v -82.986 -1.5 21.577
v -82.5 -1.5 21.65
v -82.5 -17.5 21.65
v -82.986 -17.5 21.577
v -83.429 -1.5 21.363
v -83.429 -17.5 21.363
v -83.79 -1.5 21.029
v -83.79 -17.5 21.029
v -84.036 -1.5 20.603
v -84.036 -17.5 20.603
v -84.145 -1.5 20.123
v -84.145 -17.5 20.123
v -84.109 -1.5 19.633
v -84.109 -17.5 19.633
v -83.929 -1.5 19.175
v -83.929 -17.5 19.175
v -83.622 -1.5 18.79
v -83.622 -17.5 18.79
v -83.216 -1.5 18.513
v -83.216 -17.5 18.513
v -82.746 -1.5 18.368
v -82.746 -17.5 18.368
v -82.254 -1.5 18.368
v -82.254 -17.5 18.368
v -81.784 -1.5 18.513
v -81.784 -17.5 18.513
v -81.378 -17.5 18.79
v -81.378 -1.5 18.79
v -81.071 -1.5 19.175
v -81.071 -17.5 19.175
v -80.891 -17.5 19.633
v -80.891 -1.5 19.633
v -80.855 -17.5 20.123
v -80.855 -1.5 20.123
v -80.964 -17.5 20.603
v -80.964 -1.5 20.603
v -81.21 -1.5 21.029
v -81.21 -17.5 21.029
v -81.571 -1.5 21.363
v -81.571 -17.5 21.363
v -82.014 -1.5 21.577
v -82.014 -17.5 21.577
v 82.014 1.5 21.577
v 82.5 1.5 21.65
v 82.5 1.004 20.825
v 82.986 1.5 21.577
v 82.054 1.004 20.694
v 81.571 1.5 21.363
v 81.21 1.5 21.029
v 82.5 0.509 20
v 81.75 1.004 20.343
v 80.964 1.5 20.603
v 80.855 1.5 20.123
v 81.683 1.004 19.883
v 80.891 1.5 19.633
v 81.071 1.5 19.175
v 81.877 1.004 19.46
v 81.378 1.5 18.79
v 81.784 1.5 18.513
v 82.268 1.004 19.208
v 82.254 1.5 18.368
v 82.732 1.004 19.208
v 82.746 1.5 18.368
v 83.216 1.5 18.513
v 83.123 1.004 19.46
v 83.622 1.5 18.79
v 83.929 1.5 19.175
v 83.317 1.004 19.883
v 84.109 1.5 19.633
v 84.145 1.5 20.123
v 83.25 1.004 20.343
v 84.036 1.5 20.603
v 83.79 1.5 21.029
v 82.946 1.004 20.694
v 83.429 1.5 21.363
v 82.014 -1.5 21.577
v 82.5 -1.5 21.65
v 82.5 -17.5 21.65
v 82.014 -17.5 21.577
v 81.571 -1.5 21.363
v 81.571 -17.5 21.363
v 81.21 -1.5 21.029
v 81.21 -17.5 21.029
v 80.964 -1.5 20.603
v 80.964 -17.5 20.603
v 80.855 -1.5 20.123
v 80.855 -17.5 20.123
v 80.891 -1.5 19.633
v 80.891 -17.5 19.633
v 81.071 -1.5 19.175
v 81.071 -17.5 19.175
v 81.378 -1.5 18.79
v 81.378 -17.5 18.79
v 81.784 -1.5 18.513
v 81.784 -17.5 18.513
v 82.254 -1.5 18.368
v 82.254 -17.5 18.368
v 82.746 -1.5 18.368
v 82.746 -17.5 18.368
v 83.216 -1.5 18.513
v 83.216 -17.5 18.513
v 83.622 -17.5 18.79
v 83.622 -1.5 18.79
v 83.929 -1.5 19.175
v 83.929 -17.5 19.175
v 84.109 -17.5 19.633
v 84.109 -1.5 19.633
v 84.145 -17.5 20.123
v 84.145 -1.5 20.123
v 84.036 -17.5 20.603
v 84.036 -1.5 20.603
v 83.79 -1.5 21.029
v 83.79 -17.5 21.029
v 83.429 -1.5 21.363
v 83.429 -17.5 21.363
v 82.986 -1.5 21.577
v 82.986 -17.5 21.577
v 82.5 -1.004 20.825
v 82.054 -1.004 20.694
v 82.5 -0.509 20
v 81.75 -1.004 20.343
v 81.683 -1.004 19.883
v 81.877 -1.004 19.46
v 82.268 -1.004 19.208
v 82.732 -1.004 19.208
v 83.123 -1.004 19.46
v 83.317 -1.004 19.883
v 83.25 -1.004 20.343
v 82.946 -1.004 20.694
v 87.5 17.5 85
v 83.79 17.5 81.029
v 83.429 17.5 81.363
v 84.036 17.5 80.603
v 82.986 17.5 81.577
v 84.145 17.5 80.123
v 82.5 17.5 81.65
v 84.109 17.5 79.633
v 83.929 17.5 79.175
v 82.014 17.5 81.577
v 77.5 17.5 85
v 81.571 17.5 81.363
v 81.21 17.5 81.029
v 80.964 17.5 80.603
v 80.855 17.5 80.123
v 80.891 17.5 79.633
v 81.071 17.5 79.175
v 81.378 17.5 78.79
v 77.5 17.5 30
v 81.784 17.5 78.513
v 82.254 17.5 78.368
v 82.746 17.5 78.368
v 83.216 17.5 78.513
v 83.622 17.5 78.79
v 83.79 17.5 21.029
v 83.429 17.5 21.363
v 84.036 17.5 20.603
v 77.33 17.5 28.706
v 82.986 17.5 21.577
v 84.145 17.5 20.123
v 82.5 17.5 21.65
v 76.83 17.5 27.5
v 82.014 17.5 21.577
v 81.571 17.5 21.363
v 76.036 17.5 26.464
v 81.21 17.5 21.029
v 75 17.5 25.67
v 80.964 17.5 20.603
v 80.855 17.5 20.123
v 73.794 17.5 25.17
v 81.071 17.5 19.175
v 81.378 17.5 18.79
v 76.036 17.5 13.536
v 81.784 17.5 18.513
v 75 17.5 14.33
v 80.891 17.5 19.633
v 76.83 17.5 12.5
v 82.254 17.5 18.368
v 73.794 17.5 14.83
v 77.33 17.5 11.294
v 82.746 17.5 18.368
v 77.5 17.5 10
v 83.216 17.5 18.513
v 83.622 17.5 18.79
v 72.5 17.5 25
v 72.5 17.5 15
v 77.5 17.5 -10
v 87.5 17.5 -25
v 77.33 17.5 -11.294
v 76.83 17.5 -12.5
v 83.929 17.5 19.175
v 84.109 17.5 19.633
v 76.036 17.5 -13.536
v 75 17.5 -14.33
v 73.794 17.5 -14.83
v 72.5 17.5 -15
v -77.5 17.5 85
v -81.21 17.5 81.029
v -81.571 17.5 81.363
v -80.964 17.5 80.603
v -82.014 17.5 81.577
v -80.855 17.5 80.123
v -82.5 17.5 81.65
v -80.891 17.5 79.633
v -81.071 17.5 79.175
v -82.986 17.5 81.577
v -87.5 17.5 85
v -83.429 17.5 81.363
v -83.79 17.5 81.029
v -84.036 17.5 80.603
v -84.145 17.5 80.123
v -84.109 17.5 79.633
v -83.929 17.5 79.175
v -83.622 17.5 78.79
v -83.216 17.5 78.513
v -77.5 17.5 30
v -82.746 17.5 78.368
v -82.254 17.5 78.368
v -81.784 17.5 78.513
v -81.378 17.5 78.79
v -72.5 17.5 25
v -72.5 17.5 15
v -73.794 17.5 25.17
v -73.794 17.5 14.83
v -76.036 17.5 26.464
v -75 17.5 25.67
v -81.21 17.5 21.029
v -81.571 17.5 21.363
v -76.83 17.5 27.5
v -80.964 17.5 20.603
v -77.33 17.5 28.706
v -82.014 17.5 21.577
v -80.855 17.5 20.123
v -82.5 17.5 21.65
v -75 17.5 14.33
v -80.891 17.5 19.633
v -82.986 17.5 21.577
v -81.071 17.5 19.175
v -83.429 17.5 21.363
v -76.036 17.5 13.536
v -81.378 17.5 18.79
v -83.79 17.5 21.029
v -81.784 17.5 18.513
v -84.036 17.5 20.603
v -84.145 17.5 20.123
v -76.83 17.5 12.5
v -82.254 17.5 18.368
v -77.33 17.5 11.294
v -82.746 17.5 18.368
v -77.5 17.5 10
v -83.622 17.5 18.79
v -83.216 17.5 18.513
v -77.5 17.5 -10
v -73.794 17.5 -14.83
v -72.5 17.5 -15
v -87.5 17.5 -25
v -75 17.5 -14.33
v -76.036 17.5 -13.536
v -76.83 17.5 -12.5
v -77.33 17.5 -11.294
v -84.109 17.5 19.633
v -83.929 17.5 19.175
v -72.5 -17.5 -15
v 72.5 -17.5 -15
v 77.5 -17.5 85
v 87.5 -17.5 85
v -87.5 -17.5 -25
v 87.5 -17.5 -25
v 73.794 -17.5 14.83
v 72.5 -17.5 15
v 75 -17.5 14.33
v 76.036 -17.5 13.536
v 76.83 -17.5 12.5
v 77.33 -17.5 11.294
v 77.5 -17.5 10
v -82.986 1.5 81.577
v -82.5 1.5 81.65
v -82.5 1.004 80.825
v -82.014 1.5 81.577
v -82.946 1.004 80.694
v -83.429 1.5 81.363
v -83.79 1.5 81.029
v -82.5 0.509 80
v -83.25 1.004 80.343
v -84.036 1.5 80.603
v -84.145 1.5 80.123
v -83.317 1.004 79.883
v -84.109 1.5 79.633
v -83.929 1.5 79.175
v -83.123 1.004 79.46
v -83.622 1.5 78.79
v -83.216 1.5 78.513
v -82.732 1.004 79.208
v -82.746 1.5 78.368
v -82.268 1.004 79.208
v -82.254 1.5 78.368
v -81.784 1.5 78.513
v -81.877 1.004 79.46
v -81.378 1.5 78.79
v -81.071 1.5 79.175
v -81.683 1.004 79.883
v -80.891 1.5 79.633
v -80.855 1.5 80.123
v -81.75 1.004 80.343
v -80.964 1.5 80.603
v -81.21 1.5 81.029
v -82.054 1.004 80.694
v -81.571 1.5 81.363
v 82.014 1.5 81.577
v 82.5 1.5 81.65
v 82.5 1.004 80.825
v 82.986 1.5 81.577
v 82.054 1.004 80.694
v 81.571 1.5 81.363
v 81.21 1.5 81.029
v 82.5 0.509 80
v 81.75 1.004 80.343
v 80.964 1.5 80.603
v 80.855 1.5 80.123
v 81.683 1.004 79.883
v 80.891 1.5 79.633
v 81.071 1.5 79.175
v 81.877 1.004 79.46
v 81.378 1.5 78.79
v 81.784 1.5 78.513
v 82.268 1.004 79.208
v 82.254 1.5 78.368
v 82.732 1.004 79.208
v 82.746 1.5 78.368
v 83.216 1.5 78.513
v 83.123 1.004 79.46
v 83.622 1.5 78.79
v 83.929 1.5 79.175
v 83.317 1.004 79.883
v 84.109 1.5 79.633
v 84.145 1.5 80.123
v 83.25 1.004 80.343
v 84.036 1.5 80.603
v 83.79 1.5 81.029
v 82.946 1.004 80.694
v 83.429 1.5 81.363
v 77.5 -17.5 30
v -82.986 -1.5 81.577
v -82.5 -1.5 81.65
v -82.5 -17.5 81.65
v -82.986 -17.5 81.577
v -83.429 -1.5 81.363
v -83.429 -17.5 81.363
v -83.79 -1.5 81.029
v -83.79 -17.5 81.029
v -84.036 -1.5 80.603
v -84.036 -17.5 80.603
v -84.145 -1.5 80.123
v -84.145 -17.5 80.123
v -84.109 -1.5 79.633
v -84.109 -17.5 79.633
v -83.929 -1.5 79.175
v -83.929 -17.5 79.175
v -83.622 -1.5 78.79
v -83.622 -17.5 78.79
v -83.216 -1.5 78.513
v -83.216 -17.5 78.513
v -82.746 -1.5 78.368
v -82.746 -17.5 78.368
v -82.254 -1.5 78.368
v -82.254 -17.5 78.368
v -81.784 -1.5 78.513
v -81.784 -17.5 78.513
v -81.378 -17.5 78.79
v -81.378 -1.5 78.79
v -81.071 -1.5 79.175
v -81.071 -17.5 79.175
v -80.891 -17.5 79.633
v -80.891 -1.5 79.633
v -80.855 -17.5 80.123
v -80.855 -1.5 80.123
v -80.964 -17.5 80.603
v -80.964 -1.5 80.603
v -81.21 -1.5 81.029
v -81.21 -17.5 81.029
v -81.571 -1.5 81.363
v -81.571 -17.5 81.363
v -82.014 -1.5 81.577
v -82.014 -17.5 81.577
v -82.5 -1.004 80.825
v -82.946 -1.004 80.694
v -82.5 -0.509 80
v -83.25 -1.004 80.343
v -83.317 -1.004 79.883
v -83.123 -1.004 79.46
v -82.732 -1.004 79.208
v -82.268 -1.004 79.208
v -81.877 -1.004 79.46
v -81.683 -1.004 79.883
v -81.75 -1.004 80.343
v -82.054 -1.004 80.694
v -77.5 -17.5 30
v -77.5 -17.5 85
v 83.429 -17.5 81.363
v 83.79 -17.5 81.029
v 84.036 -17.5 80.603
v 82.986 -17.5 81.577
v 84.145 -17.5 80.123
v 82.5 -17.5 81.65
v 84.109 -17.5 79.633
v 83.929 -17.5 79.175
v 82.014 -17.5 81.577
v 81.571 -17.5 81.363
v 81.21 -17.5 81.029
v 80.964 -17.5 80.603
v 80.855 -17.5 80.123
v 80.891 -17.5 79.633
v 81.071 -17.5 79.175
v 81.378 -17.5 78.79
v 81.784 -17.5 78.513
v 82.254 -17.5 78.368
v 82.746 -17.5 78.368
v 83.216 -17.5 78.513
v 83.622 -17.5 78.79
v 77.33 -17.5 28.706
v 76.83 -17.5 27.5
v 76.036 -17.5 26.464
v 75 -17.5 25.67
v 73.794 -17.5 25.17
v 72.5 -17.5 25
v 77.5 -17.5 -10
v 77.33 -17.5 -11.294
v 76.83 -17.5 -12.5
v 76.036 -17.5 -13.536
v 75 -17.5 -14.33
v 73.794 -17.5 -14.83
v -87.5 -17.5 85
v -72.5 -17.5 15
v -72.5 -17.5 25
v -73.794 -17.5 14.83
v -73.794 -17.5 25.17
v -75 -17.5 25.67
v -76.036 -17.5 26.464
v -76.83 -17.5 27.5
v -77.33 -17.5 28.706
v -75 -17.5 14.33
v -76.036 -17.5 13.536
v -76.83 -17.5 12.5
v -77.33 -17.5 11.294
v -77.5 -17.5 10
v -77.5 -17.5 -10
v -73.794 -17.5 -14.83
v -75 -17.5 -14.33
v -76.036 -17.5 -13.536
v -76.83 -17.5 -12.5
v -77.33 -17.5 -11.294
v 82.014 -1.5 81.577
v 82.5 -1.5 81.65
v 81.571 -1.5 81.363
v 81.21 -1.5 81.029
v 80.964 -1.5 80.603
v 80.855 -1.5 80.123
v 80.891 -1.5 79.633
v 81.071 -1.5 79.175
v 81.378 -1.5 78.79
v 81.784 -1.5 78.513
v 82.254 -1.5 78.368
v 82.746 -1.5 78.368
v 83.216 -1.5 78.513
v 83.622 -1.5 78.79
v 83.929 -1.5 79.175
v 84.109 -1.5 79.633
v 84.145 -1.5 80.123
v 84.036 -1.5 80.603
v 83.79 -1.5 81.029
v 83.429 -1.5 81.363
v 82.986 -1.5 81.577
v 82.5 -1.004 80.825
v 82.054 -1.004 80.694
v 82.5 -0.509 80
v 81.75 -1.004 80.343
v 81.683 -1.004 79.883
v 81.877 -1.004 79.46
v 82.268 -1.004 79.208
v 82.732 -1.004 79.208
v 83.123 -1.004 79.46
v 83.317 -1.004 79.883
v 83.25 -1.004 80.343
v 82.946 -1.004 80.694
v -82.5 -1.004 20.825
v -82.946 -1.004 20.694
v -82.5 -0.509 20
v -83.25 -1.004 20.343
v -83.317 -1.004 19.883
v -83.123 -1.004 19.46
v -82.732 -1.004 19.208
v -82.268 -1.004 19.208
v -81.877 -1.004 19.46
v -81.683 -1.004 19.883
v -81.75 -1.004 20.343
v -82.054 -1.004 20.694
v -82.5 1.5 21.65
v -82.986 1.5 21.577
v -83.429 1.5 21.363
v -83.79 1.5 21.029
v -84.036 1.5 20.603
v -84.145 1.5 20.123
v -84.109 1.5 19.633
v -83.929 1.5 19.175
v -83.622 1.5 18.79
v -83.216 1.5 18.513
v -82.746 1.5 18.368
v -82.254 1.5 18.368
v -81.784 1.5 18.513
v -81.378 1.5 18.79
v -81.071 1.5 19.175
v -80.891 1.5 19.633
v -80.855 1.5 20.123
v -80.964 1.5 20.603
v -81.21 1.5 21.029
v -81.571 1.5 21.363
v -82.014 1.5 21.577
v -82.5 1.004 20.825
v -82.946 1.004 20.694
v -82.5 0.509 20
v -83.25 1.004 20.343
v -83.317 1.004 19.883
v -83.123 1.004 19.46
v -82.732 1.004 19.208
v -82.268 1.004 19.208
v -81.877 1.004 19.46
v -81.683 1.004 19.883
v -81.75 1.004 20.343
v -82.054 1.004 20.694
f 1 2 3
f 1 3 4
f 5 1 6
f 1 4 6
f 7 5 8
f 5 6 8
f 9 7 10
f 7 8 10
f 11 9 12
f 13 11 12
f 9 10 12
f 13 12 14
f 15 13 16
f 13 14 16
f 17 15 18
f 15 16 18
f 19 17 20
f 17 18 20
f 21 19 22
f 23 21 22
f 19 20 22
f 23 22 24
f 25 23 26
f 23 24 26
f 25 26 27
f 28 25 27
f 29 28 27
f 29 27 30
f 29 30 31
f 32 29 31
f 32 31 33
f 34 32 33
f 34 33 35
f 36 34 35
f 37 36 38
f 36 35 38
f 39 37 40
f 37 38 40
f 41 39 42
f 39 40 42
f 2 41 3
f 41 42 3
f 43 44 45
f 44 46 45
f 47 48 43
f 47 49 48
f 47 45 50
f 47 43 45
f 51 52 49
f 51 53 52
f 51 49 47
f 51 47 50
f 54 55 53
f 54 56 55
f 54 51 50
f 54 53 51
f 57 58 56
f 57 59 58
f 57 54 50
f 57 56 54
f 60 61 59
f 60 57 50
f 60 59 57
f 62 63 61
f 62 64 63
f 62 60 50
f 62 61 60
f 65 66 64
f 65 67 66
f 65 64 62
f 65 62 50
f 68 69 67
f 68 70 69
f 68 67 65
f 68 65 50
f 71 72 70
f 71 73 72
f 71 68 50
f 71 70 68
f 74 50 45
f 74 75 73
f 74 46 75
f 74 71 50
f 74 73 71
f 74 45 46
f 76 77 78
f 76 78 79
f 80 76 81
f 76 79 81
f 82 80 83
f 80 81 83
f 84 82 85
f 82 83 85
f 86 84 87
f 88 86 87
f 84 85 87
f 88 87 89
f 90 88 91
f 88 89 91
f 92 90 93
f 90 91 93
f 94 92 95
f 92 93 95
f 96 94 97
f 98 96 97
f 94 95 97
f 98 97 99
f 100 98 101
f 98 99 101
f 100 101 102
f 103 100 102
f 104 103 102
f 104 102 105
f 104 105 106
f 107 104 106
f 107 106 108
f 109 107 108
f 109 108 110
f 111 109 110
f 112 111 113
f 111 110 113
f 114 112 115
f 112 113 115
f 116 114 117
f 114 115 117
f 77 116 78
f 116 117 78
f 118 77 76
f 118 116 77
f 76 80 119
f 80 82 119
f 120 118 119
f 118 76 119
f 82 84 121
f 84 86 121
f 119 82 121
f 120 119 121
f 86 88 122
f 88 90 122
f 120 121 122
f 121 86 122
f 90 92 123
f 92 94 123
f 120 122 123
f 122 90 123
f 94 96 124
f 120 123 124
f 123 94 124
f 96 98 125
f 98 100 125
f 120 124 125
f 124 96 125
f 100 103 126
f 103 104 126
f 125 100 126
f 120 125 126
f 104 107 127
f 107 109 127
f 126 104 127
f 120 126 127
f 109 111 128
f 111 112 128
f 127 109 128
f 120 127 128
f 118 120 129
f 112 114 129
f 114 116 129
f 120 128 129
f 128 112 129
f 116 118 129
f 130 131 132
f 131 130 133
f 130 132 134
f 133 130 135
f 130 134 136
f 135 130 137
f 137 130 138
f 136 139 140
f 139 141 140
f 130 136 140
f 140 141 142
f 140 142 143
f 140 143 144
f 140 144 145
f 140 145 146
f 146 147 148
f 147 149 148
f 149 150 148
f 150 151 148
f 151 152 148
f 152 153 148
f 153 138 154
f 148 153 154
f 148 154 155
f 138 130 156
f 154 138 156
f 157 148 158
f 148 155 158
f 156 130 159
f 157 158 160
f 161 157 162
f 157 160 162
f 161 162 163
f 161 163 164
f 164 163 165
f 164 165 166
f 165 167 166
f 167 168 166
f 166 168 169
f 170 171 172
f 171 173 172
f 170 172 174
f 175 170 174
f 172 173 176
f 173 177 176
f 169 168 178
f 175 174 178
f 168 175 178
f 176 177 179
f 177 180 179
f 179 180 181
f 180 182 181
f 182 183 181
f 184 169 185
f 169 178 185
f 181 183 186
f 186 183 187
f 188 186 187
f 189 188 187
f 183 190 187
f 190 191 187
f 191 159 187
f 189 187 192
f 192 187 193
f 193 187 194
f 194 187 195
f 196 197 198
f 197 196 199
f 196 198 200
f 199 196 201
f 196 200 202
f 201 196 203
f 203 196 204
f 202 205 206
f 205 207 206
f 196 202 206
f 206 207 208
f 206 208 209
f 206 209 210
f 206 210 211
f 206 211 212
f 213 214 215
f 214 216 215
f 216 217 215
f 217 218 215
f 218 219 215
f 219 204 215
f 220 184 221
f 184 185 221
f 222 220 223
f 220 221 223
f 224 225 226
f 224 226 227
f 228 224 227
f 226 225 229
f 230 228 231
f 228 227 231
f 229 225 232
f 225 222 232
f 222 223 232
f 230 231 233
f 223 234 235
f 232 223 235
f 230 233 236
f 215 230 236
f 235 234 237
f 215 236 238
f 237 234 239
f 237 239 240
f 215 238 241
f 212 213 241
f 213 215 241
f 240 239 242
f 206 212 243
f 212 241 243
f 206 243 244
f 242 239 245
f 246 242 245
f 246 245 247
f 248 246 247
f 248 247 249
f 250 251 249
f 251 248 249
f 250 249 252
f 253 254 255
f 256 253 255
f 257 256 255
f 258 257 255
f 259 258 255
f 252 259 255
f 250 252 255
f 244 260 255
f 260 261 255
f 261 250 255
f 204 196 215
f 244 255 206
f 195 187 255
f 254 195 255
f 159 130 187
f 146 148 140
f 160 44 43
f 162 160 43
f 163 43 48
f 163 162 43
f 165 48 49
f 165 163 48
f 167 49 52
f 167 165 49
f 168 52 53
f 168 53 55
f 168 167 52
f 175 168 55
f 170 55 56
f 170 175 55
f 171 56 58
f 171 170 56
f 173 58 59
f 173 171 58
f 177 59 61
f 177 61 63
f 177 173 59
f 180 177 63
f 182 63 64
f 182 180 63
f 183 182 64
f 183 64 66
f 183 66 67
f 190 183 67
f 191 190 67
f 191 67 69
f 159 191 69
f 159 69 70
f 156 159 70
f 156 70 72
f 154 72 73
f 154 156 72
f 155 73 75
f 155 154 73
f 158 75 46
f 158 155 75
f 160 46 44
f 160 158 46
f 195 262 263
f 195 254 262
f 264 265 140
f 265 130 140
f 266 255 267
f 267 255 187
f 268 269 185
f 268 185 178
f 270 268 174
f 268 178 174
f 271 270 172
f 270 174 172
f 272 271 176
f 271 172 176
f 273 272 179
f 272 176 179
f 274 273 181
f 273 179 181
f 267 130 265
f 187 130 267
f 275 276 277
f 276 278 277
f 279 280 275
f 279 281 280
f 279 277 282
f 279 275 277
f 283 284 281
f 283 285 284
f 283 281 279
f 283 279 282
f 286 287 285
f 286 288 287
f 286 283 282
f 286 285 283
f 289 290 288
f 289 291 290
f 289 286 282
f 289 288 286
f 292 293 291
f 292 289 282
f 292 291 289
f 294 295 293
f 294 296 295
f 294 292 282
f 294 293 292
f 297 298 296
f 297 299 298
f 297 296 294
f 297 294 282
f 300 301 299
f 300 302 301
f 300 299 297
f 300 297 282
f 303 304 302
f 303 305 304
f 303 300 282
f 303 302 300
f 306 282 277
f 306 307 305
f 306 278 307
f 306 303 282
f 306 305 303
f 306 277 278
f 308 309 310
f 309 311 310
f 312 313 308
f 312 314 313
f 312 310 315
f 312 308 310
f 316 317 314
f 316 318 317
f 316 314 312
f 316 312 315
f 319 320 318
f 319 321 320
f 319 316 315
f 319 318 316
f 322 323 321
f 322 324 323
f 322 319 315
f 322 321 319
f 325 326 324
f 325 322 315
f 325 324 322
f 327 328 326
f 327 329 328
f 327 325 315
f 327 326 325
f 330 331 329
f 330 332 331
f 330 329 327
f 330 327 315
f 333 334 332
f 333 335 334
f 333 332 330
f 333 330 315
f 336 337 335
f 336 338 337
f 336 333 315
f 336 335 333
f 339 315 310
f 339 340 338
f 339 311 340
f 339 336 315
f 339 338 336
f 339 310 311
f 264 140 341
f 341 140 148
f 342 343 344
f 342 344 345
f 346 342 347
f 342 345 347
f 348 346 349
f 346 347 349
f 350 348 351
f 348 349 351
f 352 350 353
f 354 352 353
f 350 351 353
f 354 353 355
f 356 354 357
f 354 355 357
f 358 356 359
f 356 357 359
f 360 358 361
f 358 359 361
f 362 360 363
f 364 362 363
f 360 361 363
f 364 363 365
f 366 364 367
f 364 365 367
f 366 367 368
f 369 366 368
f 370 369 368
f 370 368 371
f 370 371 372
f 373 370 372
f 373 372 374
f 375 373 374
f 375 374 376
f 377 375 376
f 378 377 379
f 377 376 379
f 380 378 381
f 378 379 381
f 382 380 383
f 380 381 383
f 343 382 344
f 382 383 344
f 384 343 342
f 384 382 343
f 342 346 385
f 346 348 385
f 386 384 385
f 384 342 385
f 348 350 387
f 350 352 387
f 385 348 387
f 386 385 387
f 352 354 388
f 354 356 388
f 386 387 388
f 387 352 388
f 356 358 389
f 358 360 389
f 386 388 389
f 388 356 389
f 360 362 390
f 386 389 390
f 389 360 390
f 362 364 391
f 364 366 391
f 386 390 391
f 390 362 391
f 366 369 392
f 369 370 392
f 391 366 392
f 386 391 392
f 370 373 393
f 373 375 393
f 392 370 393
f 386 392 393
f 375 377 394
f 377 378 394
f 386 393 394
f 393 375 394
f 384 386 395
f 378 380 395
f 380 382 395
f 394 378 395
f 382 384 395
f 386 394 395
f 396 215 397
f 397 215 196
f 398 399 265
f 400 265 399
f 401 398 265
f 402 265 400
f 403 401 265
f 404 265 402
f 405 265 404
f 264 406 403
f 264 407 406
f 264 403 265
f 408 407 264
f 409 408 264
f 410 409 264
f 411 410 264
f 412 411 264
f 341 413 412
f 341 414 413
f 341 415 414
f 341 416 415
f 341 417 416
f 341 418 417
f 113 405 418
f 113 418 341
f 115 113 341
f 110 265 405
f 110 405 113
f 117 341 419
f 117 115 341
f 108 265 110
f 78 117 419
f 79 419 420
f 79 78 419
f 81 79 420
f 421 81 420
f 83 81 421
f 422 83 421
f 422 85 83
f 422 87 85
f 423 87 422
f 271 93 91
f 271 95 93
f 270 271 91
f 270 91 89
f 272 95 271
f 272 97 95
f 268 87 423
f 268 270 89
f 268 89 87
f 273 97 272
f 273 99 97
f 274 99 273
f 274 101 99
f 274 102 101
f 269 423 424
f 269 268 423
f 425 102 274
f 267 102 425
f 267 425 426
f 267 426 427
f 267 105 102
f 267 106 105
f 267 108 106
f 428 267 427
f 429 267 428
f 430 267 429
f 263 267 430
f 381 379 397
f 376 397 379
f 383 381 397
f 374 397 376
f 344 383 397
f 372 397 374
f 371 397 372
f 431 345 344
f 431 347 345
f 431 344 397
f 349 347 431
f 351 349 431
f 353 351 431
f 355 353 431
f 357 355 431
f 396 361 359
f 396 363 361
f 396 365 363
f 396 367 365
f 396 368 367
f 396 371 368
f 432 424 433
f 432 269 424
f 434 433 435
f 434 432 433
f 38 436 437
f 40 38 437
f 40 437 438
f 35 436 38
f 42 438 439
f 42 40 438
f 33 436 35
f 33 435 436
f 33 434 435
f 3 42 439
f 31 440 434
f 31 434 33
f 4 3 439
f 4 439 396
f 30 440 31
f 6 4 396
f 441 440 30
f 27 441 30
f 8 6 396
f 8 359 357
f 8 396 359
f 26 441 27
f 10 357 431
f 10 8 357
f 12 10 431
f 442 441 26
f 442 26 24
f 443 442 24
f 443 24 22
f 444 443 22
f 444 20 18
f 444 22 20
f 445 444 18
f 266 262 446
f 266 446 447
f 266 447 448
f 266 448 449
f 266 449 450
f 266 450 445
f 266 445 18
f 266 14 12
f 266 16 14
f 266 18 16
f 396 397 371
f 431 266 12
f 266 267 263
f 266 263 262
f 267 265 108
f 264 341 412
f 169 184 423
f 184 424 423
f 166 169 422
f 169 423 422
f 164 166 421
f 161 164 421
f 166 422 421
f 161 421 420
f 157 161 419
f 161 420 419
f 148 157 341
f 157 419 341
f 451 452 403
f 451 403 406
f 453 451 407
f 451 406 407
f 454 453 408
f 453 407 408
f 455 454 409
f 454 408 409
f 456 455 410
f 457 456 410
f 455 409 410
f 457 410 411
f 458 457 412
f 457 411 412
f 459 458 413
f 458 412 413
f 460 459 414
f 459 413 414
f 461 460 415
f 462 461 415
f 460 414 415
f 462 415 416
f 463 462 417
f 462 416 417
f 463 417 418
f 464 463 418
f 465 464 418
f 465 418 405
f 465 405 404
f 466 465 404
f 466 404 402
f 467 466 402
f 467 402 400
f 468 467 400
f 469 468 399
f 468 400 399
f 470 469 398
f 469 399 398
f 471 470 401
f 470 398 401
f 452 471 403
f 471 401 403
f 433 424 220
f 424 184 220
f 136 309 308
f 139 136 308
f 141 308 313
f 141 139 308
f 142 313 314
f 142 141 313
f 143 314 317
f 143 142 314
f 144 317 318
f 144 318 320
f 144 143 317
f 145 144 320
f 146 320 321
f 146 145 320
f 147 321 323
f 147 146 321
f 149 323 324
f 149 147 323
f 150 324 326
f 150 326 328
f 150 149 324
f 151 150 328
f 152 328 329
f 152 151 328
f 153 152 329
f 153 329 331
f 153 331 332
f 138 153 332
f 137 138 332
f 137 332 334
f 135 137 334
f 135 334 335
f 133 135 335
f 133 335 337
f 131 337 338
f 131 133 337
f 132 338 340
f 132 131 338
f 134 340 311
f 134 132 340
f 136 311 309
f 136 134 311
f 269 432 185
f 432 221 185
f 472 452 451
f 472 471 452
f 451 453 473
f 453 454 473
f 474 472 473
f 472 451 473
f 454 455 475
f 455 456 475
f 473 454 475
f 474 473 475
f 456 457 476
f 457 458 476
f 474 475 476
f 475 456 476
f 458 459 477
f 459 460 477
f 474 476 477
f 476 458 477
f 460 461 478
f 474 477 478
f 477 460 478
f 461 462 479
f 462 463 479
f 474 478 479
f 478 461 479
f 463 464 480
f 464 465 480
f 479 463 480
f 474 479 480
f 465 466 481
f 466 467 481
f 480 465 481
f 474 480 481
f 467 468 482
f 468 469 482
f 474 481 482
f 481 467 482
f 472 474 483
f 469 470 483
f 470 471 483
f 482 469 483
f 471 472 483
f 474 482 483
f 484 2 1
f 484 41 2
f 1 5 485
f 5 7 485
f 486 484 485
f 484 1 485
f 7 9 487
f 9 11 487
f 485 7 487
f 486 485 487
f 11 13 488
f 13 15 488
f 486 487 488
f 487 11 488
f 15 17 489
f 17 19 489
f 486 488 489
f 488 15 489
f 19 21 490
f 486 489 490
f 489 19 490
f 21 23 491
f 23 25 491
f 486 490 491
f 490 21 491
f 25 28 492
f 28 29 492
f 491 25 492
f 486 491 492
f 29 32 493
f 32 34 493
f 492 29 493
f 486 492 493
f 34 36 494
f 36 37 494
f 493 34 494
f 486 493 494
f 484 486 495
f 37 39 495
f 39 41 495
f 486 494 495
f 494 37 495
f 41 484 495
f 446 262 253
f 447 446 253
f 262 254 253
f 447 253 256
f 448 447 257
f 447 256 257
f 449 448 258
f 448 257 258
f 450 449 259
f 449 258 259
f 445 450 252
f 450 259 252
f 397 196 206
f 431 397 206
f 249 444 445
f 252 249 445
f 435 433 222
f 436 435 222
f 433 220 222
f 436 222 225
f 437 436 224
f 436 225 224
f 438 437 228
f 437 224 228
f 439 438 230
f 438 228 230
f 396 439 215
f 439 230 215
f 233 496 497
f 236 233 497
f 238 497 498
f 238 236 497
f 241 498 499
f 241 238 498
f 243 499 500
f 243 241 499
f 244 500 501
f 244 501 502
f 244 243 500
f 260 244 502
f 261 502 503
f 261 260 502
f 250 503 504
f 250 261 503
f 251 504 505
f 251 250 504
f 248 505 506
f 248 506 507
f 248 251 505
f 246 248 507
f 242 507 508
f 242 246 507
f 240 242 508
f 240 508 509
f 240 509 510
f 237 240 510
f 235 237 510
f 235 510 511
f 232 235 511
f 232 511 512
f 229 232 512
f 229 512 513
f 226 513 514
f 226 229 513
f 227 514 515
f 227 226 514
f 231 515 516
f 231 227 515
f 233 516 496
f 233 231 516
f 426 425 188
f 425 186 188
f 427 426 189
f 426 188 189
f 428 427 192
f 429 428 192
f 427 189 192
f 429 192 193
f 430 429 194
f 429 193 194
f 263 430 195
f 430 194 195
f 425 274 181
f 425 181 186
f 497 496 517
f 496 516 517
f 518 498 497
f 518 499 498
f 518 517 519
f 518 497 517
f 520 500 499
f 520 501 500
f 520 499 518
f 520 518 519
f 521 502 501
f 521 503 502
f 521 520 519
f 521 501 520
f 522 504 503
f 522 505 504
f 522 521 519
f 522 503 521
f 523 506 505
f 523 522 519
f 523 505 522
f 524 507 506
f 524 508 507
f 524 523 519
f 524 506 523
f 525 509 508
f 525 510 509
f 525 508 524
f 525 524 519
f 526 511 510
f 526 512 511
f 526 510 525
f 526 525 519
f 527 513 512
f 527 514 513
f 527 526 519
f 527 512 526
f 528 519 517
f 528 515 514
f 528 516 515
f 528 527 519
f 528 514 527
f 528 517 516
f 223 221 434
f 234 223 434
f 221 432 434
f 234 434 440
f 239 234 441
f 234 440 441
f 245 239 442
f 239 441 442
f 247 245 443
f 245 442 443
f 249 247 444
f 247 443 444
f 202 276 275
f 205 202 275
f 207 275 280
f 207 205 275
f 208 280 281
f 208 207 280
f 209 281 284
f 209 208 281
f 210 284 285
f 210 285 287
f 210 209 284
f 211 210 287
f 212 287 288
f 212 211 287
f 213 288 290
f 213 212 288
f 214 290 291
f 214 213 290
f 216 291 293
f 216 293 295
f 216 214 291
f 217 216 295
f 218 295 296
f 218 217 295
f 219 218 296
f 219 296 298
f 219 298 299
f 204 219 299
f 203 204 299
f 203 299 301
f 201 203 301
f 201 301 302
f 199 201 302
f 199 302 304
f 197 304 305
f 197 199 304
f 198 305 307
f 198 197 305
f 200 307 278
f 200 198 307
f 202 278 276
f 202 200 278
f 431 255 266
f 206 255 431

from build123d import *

# Parameters (mm, degrees)
SKETCH1_W                  = 155
SKETCH1_H                  = 30
BOSS_EXTRUDE1_DEPTH        = 17.5
FILLET1_R                  = 5
M4_TAPPED_HOLE2_AT_2_COUNT = 2
M4_TAPPED_HOLE2_AT_2_PITCH = 60
M4_TAPPED_HOLE2_AT_3_COUNT = 2
M4_TAPPED_HOLE2_AT_3_PITCH = 175.570498661
M4_TAPPED_HOLE2_AT_4_COUNT = 2
M4_TAPPED_HOLE2_AT_4_PITCH = 165


with BuildPart() as part:
    # Sketch1 → Boss-Extrude1 (new, symmetric)
    with BuildSketch(Plane(origin=(0, 0, 0), x_dir=(1, 0, 0), z_dir=(0, 1, 0))):
        Polygon((-87.5, 25), (87.5, 25), (87.5, -25), (87.5, -85), (77.5, -85), (77.5, -25), (-77.5, -25), (-77.5, -85), (-87.5, -85), (-87.5, -25), align=None)
        Rectangle(SKETCH1_W, SKETCH1_H, mode=Mode.SUBTRACT)
    extrude(amount=BOSS_EXTRUDE1_DEPTH, both=True)

    # Fillet1
    fillet1_edges = [part.edges().sort_by_distance(p)[0] for p in [
        (77.5, 0, 25),
        (-77.5, 0, 25),
        (-77.5, 0, 15),
        (-77.5, 0, -15),
        (77.5, 0, -15),
        (77.5, 0, 15),
    ]]
    fillet(fillet1_edges, radius=FILLET1_R)

    # Sketch4 → M4 Tapped Hole2 (revolve, cut)
    with BuildSketch(Plane(origin=(-82.5, 17.5, 20), x_dir=(0, 0, 1), z_dir=(1, 0, 0))):
        Polygon((0, 0), (0, 16.991420021), (1.65, 16), (1.65, 0), align=None)
    m4_tapped_hole2 = revolve(axis=Axis((-82.5, 23.85, 20), (0, -1, 0)), mode=Mode.SUBTRACT)

    # M4 Tapped Hole2 at 2: M4 Tapped Hole2 ×2
    with Locations(*[(0, 0, i * M4_TAPPED_HOLE2_AT_2_PITCH) for i in range(1, M4_TAPPED_HOLE2_AT_2_COUNT)]):
        add(m4_tapped_hole2, mode=Mode.SUBTRACT)

    # M4 Tapped Hole2 at 3: M4 Tapped Hole2 ×2
    with Locations(*[Vector(0.9397934234884371, 0, 0.3417430630867045) * (i * M4_TAPPED_HOLE2_AT_3_PITCH) for i in range(1, M4_TAPPED_HOLE2_AT_3_COUNT)]):
        add(m4_tapped_hole2, mode=Mode.SUBTRACT)

    # M4 Tapped Hole2 at 4: M4 Tapped Hole2 ×2
    with Locations(*[(i * M4_TAPPED_HOLE2_AT_4_PITCH, 0, 0) for i in range(1, M4_TAPPED_HOLE2_AT_4_COUNT)]):
        add(m4_tapped_hole2, mode=Mode.SUBTRACT)

    # Mirror1: M4 Tapped Hole2 across plane
    add(m4_tapped_hole2.mirror(Plane.ZX), mode=Mode.SUBTRACT)

    # Mirror1 copy 1 sketch → Mirror1 copy 1 (revolve, cut)
    with BuildSketch(Plane(origin=(-82.5, -17.5, 80), x_dir=(0, 0, 1), z_dir=(1, 0, 0))):
        Polygon((0, 0), (0, -16.991420021), (1.65, -16), (1.65, 0), align=None)
    revolve(axis=Axis((-82.5, -23.85, 80), (0, -1, 0)), mode=Mode.SUBTRACT)

    # Mirror1 copy 2 sketch → Mirror1 copy 2 (revolve, cut)
    with BuildSketch(Plane(origin=(82.5, -17.5, 80), x_dir=(0, 0, 1), z_dir=(1, 0, 0))):
        Polygon((0, 0), (0, -16.991420021), (1.65, -16), (1.65, 0), align=None)
    revolve(axis=Axis((82.5, -23.85, 80), (0, -1, 0)), mode=Mode.SUBTRACT)

    # Mirror1 copy 3 sketch → Mirror1 copy 3 (revolve, cut)
    with BuildSketch(Plane(origin=(82.5, -17.5, 20), x_dir=(0, 0, 1), z_dir=(1, 0, 0))):
        Polygon((0, 0), (0, -16.991420021), (1.65, -16), (1.65, 0), align=None)
    revolve(axis=Axis((82.5, -23.85, 20), (0, -1, 0)), mode=Mode.SUBTRACT)


solid = part.part
